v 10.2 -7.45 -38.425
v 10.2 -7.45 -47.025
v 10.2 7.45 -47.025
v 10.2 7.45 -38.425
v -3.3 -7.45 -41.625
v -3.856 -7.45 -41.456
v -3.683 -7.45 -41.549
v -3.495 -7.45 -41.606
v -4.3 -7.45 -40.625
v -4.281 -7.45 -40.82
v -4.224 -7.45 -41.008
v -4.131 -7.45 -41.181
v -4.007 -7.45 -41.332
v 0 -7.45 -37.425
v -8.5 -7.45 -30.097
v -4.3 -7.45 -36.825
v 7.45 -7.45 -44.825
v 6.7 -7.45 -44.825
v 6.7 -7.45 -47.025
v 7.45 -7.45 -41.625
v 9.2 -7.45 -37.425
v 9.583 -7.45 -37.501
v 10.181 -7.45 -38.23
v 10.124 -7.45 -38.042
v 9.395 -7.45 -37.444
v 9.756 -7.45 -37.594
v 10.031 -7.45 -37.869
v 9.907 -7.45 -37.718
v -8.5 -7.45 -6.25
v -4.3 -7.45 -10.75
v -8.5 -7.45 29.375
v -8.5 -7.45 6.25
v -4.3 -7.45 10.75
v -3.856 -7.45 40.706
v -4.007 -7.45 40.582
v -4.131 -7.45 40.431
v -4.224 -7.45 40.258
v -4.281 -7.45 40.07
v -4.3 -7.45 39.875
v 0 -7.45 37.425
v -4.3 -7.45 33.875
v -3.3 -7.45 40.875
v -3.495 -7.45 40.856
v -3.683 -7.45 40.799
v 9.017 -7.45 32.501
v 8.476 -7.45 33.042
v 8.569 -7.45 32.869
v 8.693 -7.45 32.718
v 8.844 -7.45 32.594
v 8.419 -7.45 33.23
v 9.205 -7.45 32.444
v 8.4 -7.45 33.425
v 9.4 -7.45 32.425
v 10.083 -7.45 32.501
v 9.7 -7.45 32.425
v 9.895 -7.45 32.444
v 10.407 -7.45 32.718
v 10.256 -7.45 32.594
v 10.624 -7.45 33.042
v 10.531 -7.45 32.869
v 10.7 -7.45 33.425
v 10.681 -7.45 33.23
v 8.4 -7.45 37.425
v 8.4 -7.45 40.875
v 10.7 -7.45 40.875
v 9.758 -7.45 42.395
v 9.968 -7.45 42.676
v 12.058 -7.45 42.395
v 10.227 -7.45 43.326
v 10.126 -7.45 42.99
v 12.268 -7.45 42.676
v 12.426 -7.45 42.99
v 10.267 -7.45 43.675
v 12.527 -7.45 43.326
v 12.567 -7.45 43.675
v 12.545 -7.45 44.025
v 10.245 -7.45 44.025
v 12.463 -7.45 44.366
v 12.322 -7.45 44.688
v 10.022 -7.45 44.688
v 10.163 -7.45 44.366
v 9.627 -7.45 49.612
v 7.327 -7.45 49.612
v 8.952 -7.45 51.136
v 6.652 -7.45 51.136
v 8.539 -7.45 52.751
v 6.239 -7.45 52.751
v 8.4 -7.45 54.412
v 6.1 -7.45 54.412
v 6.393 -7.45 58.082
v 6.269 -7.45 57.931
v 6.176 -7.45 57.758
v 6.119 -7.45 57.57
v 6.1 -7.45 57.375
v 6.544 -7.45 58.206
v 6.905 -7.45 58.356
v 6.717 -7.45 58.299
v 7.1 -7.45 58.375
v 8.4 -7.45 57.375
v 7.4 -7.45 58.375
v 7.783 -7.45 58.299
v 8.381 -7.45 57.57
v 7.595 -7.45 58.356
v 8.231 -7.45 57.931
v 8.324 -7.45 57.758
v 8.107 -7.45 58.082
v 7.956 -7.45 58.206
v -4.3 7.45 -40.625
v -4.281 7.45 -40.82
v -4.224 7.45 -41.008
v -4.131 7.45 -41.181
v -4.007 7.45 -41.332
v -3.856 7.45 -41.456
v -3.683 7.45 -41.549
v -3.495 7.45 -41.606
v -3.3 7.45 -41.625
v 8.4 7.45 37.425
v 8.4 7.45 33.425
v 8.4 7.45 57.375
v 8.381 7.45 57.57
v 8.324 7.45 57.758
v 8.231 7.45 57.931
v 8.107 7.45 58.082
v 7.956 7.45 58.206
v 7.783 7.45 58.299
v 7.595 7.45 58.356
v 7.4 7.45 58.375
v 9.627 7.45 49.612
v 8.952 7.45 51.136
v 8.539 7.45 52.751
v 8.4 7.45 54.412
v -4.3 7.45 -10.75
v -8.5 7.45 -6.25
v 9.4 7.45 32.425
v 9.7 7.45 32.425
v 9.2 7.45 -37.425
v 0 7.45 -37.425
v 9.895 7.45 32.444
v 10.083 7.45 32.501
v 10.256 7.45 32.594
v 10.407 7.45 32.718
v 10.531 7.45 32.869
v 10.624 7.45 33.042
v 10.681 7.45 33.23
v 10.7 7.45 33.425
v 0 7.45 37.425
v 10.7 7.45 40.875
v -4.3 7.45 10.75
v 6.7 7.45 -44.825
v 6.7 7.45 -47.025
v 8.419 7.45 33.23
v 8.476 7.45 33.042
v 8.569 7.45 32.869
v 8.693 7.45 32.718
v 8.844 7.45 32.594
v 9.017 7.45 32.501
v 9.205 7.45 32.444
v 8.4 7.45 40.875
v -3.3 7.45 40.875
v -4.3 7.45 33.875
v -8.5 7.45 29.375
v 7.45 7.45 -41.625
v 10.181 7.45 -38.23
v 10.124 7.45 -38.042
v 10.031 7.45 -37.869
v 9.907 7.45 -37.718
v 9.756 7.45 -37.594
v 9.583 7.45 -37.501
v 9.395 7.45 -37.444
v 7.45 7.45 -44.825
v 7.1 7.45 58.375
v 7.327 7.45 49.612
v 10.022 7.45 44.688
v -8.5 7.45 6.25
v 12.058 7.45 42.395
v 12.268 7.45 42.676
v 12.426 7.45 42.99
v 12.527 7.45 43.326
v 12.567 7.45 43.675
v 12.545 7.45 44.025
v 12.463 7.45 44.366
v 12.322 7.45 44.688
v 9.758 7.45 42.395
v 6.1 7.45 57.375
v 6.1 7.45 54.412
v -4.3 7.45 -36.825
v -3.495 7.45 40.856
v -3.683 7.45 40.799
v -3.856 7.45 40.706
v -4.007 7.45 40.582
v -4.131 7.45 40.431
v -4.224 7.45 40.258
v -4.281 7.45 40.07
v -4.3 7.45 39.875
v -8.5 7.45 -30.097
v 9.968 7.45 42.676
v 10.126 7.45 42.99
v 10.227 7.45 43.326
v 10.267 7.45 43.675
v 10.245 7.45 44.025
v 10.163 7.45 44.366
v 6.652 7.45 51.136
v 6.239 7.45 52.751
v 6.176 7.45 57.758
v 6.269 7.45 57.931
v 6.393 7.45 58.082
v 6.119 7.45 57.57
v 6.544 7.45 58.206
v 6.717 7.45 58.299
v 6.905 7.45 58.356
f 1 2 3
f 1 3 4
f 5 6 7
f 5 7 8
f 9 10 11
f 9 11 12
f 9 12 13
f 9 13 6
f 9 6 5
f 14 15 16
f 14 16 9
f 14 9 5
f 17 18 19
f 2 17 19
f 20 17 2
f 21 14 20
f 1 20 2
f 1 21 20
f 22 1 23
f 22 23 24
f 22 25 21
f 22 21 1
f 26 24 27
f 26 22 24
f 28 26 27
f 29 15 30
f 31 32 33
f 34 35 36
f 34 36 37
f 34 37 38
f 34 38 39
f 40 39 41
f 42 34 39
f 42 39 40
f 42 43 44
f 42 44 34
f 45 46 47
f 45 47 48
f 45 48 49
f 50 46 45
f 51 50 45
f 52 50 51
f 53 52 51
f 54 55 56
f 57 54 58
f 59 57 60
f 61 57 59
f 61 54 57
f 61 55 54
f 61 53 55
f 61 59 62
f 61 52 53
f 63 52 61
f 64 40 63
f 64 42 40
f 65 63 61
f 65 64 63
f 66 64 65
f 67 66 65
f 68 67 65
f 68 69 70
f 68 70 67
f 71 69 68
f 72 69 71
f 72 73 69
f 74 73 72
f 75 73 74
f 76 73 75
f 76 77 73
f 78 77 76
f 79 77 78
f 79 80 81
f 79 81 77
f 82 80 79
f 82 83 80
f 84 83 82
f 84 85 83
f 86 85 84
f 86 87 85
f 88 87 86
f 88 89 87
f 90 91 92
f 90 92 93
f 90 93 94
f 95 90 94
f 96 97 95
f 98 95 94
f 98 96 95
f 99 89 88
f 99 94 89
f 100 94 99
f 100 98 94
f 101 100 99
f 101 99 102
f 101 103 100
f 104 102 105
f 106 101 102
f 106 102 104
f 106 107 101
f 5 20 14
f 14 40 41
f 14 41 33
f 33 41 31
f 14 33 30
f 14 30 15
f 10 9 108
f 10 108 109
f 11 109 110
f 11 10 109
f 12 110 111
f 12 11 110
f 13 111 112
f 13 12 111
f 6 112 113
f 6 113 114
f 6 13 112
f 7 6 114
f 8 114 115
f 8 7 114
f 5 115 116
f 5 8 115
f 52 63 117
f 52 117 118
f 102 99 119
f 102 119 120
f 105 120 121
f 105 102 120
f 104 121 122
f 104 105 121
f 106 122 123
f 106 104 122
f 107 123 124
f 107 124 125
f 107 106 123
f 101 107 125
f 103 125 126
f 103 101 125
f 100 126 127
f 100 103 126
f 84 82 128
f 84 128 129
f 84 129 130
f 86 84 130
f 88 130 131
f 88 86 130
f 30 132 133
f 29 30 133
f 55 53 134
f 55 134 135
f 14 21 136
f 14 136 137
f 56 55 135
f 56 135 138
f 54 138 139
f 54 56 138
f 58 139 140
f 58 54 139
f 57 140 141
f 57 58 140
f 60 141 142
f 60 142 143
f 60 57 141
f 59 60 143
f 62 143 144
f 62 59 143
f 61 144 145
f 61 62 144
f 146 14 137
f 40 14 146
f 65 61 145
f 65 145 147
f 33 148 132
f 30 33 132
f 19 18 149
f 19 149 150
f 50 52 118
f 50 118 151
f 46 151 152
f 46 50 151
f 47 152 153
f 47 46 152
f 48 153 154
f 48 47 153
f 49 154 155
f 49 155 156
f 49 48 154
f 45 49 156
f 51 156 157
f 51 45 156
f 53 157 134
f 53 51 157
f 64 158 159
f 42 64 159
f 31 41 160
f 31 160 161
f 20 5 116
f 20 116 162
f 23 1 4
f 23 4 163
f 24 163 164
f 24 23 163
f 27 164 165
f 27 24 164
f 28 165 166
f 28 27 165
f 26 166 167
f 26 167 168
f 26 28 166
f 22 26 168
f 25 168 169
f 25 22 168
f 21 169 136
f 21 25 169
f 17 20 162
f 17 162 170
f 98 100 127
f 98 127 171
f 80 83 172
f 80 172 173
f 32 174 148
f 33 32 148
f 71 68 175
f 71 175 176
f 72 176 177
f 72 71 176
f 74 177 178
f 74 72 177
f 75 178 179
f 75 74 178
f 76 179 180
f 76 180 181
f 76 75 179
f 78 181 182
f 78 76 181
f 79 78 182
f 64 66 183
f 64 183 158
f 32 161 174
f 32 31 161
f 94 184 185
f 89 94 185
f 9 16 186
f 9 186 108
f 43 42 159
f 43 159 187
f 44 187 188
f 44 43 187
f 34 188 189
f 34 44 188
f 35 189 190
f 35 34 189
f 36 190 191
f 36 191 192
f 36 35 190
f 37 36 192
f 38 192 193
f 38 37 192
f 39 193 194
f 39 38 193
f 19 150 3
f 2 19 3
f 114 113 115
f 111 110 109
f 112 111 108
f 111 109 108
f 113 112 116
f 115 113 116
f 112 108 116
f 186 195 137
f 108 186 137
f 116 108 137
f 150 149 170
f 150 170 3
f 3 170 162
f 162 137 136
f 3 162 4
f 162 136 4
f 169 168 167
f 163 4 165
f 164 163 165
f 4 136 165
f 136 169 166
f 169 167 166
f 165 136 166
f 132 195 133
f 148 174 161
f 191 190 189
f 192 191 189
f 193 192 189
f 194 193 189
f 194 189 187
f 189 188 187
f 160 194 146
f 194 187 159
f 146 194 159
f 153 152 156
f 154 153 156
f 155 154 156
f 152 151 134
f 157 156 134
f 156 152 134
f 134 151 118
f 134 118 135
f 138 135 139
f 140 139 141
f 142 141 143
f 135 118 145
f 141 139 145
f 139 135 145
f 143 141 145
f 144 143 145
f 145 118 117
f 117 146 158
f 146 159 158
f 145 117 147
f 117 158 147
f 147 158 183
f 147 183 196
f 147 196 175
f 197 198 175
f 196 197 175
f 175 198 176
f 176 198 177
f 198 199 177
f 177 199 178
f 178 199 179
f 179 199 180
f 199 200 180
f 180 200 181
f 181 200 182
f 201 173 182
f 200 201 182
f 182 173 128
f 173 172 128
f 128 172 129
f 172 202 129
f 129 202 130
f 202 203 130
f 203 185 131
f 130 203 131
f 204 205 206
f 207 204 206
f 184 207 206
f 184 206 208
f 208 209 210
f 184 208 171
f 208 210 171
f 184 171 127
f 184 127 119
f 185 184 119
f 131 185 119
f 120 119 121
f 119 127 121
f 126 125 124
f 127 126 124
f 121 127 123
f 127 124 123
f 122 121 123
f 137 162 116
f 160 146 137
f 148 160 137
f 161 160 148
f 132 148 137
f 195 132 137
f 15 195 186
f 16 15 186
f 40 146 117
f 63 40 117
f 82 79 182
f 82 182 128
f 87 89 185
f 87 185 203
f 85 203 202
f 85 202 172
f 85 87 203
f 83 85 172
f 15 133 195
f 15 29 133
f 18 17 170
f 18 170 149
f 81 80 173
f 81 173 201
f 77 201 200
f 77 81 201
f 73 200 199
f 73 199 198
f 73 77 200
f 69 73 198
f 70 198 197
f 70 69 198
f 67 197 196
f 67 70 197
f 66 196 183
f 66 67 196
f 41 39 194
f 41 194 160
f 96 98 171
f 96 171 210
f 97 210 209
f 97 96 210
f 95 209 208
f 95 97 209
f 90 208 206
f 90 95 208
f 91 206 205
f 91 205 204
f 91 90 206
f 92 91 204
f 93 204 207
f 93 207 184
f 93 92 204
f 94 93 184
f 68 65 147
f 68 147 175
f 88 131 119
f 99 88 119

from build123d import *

# Parameters (mm, degrees)
F1_DEPTH = 7.45
F2_W     = 9.95
F2_H     = 59.4720471648
F3_DEPTH = 14.901
F5_DEPTH = 14.9


with BuildPart() as f1:
    # F0 (on Front) → F1 (new body, symmetric)
    with BuildSketch(Plane.XZ):
        with BuildLine():
            Line((-8.5, -30.0970471648), (-4.3, -36.825))
            Line((-4.3, -36.825), (-4.3, -40.625))
            ThreePointArc((-4.3, -40.625), (-4.0071067812, -41.3321067812), (-3.3, -41.625))
            Line((-3.3, -41.625), (7.45, -41.625))
            Line((7.45, -41.625), (7.45, -44.825))
            Line((7.45, -44.825), (6.7, -44.825))
            Line((6.7, -44.825), (6.7, -47.025))
            Line((6.7, -47.025), (10.2, -47.025))
            Line((10.2, -47.025), (10.2, -38.425))
            ThreePointArc((10.2, -38.425), (9.9071067812, -37.7178932188), (9.2, -37.425))
            Line((9.2, -37.425), (0, -37.425))
            Line((0, -37.425), (0, 37.425))
            Line((0, 37.425), (8.4, 37.425))
            Line((8.4, 37.425), (8.4, 33.425))
            ThreePointArc((8.4, 33.425), (8.6928932188, 32.7178932188), (9.4, 32.425))
            Line((9.4, 32.425), (9.7, 32.425))
            ThreePointArc((9.7, 32.425), (10.4071067812, 32.7178932188), (10.7, 33.425))
            Line((10.7, 33.425), (10.7, 40.875))
            Line((10.7, 40.875), (12.0584372697, 42.3947607825))
            ThreePointArc((12.0584372697, 42.3947607825), (12.5542284753, 43.4993517405), (12.3218441058, 44.6875973417))
            Line((12.3218441058, 44.6875973417), (9.6272657122, 49.6124442137))
            ThreePointArc((9.6272657122, 49.6124442137), (8.7116734449, 51.9351925206), (8.4, 54.4123539124))
            Line((8.4, 54.4123539124), (8.4, 57.375))
            ThreePointArc((8.4, 57.375), (8.1071067812, 58.0821067812), (7.4, 58.375))
            Line((7.4, 58.375), (7.1, 58.375))
            ThreePointArc((7.1, 58.375), (6.3928932188, 58.0821067812), (6.1, 57.375))
            Line((6.1, 57.375), (6.1, 54.4123539124))
            ThreePointArc((6.1, 54.4123539124), (6.4116734449, 51.9351925206), (7.3272657122, 49.6124442137))
            Line((7.3272657122, 49.6124442137), (10.0218441058, 44.6875973417))
            ThreePointArc((10.0218441058, 44.6875973417), (10.2542284753, 43.4993517405), (9.7584372697, 42.3947607825))
            Line((9.7584372697, 42.3947607825), (8.4, 40.875))
            Line((8.4, 40.875), (-3.3, 40.875))
            ThreePointArc((-3.3, 40.875), (-4.0071067812, 40.5821067812), (-4.3, 39.875))
            Line((-4.3, 39.875), (-4.3, 33.875))
            Line((-4.3, 33.875), (-8.5, 29.375))
            Line((-8.5, 29.375), (-8.5, 20.075))
            Line((-8.5, 20.075), (-13.95, 20.075))
            Line((-13.95, 20.075), (-13.95, 29.375))
            Line((-13.95, 29.375), (-16.45, 29.375))
            ThreePointArc((-16.45, 29.375), (-17.8642135624, 28.7892135624), (-18.45, 27.375))
            Line((-18.45, 27.375), (-18.45, 13.875))
            Line((-18.45, 13.875), (-8.5, 6.6029528352))
            Line((-8.5, 6.6029528352), (-8.5, -30.0970471648))
        make_face()
    extrude(amount=F1_DEPTH, both=True)

    # F2 (on face) → F3 (cut, through all)
    with BuildSketch(Plane.XZ.offset(7.45)):
        with Locations((-13.475, -0.3610235824)):
            Rectangle(F2_W, F2_H)
    extrude(amount=-F3_DEPTH, mode=Mode.SUBTRACT)

    # F4 (on face) → F5 (cut, through all)
    with BuildSketch(Plane(origin=(0, 7.45, 0), x_dir=(-1, 0, 0), z_dir=(0, 1, 0))):
        Polygon((10, -4.6428571429), (10, 4.6428571429), (4.3, 10.75), (4.3, 0), (4.3, -10.75), align=None)
    extrude(amount=-F5_DEPTH, mode=Mode.SUBTRACT)


solid = f1.part
